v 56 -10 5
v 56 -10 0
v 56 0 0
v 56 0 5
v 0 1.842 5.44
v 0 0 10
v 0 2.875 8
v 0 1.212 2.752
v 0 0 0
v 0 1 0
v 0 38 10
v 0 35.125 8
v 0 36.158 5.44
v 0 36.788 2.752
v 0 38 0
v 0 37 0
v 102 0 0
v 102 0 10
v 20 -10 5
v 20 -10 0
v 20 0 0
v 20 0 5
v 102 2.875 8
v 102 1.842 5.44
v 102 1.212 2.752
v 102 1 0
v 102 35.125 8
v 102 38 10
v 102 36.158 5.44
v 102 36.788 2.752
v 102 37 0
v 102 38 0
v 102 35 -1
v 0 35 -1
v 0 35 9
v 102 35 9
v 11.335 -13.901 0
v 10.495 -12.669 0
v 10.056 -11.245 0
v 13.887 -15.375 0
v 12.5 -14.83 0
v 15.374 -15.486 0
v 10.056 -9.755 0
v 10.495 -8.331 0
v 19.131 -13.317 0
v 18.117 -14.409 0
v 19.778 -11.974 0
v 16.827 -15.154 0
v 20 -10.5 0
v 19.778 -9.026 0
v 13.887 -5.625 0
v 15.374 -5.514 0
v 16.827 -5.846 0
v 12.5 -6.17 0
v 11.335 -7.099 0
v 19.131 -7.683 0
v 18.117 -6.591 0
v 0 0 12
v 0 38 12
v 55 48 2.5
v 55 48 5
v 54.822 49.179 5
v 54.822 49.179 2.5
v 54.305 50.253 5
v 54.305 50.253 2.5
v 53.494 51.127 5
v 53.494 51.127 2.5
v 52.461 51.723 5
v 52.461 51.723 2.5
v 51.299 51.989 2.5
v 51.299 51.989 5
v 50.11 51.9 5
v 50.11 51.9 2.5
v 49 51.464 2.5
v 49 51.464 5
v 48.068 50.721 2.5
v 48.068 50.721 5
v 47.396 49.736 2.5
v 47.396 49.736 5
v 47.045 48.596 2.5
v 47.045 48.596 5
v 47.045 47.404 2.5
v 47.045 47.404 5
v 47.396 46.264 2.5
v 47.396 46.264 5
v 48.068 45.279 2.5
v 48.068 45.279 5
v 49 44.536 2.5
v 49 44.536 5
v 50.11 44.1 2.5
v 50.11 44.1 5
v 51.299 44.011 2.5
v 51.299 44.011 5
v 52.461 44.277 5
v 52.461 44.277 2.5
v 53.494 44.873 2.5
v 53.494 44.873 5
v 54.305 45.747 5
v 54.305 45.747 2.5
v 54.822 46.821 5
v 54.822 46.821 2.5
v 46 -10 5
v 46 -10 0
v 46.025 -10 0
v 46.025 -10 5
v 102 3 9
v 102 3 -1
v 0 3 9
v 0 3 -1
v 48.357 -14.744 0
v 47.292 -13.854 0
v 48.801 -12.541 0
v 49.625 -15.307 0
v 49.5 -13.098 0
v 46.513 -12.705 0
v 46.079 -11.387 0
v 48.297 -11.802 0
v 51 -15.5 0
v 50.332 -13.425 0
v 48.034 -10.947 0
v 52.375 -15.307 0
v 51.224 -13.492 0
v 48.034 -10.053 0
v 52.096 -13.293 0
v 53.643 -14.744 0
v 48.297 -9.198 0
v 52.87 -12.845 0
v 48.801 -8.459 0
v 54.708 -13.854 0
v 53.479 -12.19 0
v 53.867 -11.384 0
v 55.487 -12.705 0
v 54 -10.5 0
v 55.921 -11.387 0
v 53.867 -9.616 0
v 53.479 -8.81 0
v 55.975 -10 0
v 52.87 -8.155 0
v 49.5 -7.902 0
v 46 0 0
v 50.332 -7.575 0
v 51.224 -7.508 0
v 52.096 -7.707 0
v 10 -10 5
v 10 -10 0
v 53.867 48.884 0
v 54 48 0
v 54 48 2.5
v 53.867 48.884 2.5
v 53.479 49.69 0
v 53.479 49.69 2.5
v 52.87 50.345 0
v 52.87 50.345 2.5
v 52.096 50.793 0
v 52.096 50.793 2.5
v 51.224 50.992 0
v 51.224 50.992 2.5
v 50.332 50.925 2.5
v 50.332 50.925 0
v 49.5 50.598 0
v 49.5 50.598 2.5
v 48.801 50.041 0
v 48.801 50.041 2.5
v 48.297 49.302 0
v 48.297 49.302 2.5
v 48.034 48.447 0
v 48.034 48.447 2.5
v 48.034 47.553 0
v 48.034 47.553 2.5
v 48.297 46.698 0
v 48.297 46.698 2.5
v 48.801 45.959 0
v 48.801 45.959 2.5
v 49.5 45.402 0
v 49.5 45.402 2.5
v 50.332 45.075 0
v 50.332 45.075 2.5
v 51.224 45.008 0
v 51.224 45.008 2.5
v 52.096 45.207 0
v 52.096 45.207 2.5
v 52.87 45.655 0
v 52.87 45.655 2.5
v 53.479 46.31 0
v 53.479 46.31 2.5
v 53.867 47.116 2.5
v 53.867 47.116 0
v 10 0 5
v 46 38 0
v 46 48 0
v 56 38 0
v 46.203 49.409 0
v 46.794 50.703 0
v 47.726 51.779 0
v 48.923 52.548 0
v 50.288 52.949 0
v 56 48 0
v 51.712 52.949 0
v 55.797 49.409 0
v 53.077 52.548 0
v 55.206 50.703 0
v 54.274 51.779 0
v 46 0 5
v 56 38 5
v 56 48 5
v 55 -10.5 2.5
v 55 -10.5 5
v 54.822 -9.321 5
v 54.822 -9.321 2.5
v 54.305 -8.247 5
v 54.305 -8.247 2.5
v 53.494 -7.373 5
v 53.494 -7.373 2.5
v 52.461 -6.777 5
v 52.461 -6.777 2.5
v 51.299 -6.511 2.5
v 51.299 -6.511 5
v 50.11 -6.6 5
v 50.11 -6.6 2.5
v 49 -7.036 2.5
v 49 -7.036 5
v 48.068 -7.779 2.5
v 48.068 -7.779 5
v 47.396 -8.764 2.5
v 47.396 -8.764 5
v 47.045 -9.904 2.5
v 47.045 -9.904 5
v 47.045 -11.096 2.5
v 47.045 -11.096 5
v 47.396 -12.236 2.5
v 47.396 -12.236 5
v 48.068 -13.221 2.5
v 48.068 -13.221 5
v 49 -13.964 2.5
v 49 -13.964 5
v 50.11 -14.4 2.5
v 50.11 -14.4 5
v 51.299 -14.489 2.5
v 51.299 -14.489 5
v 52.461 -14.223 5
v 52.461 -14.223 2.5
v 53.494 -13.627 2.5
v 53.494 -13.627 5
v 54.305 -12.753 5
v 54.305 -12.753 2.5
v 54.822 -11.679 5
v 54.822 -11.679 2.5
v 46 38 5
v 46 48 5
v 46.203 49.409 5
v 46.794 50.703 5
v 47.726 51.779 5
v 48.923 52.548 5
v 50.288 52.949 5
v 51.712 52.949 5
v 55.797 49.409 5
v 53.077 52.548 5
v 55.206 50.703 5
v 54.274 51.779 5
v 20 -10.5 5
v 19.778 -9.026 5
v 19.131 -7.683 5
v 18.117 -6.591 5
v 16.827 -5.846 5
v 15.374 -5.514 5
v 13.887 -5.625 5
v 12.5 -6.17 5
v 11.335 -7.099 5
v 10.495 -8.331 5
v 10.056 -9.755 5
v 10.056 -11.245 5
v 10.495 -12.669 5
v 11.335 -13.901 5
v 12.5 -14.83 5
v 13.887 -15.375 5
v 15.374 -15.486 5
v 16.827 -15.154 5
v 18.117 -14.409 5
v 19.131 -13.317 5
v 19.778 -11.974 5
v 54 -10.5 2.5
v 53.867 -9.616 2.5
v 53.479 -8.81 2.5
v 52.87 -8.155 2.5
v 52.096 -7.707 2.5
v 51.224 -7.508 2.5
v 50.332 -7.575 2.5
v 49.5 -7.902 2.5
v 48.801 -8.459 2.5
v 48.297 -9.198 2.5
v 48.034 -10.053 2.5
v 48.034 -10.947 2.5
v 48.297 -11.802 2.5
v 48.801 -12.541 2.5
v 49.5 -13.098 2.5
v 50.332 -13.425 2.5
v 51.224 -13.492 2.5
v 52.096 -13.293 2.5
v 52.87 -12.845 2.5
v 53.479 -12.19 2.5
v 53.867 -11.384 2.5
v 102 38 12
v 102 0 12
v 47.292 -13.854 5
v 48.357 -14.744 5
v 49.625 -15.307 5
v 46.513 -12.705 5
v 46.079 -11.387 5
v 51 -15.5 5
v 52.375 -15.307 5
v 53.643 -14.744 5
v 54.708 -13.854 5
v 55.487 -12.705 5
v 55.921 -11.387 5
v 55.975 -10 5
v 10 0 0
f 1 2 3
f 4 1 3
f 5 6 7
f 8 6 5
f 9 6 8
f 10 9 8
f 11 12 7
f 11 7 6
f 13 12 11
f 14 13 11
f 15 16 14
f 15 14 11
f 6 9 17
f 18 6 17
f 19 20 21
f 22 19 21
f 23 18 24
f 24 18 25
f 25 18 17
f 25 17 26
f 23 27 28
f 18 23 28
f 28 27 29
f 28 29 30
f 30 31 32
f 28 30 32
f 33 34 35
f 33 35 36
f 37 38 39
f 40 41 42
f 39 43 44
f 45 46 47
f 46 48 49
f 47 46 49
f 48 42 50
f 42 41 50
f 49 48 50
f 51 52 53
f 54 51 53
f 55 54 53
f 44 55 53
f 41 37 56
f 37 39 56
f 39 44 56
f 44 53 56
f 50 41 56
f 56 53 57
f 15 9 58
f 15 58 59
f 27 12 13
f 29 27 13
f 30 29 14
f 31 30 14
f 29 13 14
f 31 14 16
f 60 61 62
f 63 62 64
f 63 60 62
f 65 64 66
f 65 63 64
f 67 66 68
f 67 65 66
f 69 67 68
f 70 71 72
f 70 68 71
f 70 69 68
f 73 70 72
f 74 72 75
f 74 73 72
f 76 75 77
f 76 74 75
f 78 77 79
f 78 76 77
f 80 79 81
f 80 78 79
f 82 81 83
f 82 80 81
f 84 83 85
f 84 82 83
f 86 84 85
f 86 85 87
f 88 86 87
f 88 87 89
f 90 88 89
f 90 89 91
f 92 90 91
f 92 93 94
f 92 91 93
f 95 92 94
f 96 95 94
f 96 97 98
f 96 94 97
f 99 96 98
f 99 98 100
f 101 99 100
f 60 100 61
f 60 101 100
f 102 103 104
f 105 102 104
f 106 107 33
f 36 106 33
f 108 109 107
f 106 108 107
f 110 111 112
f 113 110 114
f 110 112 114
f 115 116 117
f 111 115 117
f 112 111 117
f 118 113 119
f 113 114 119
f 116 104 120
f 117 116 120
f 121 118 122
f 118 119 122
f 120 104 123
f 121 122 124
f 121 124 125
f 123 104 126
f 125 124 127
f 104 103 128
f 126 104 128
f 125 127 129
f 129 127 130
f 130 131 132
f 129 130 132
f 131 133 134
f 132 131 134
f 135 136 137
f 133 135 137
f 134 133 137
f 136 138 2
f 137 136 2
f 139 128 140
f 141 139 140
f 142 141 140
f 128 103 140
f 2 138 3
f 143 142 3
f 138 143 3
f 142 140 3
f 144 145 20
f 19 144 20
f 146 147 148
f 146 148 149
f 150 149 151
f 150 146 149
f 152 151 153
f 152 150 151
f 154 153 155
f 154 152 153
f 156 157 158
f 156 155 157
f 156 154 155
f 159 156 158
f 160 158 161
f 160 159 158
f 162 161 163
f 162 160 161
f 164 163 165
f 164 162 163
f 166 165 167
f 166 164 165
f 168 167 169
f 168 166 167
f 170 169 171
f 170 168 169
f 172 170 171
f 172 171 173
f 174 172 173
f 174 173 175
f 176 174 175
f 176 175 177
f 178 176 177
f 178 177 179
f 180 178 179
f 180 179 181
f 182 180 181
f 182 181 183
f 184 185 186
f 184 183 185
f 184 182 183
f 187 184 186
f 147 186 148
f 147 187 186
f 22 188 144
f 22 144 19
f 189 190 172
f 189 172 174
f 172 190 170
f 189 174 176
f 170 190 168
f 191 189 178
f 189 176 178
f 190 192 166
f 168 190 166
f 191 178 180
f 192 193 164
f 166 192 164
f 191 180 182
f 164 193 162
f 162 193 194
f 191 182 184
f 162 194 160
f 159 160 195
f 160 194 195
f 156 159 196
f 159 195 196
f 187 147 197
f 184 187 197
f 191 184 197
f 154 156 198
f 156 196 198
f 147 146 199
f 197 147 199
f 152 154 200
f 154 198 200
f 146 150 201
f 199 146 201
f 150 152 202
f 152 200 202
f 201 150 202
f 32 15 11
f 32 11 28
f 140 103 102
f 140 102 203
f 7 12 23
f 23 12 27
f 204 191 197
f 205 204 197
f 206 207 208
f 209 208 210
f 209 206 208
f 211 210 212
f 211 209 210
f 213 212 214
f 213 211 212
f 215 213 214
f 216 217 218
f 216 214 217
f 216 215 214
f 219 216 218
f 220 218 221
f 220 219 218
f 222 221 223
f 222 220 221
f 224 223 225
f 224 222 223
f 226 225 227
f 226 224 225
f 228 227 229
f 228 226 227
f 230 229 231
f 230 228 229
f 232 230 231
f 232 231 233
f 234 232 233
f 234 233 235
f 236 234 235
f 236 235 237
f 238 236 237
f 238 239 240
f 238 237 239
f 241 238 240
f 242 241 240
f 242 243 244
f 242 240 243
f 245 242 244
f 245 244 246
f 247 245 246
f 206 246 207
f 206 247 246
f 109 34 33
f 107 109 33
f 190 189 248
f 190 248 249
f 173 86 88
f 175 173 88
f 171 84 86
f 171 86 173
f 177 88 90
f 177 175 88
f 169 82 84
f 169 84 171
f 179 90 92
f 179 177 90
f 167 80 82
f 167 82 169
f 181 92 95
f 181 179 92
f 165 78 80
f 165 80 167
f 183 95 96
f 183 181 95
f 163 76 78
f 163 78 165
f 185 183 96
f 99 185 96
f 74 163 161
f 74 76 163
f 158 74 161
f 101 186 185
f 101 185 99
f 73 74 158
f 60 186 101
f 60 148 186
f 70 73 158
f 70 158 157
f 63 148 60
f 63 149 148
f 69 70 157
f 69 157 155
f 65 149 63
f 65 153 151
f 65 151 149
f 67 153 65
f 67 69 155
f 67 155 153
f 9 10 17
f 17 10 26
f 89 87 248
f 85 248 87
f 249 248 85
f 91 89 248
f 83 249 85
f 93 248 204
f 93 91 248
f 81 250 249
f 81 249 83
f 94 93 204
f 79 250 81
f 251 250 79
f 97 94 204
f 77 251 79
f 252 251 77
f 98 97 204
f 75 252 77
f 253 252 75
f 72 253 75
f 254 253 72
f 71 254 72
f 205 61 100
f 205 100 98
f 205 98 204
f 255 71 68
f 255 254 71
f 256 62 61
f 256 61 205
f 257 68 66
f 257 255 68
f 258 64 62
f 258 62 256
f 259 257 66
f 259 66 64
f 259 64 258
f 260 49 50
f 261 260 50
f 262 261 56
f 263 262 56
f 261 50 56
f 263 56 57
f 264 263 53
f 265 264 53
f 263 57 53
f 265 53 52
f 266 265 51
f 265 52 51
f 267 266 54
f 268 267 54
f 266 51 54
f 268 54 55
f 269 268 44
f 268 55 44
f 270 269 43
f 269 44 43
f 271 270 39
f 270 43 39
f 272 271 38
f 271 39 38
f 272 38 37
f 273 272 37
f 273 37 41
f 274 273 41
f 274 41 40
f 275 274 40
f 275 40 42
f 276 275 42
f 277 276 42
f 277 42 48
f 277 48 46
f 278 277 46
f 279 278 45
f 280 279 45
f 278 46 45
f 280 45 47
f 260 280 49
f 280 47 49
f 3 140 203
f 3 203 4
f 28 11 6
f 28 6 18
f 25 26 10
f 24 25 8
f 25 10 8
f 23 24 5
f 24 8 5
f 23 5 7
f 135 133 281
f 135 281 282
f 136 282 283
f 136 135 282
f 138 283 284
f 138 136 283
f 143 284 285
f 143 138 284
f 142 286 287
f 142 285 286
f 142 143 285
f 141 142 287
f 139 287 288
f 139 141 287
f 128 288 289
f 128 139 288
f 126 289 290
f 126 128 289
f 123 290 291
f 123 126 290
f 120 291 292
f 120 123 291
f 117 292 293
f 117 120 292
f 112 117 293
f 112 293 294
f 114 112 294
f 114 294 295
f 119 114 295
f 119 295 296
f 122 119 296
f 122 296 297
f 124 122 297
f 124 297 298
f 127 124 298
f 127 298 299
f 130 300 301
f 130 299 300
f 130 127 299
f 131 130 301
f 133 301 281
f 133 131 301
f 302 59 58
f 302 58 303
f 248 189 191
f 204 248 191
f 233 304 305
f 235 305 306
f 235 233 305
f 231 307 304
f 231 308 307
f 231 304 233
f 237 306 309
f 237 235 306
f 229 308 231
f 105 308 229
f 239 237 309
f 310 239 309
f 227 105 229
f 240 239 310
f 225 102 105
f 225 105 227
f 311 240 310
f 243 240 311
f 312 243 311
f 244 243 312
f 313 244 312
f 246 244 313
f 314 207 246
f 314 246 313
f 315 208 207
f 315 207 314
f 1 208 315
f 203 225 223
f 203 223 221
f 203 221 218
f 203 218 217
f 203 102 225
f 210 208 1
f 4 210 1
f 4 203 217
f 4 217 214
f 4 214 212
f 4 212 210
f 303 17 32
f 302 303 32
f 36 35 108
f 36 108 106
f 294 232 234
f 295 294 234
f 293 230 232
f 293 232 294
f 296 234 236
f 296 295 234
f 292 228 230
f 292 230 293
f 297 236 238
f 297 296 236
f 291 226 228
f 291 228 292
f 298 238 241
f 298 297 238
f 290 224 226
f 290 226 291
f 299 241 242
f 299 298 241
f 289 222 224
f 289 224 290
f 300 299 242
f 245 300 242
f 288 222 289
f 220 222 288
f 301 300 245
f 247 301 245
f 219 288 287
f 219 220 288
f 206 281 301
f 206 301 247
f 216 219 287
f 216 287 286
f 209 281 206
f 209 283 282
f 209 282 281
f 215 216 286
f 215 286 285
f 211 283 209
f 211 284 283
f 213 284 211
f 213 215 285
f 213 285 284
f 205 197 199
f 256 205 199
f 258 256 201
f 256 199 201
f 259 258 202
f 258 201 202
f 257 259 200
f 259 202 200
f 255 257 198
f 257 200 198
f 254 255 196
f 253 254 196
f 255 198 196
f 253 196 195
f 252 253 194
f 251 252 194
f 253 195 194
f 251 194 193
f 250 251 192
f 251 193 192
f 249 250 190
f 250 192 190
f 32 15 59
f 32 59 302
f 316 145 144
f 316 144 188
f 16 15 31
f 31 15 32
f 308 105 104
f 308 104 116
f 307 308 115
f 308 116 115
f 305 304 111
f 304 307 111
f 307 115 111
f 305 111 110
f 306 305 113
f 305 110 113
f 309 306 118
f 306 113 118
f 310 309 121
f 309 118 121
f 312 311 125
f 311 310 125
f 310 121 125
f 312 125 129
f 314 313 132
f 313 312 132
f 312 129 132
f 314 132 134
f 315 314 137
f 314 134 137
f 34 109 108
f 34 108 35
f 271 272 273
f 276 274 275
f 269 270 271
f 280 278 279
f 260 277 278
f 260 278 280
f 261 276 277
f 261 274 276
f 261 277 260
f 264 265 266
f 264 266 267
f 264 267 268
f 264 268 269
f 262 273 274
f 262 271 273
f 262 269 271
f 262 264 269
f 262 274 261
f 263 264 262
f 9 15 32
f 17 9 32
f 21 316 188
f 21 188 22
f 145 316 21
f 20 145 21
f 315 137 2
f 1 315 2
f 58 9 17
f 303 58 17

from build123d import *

# Parameters (mm, degrees)
BOX002_W          = 102
BOX002_H          = 38
BOX002_DEPTH      = 10
CYLINDER003_W     = 18
CYLINDER003_H     = 102
CYLINDER003_ANGLE = 180
BOX_W             = 102
BOX_H             = 38
BOX_DEPTH         = 10
BOX004_W          = 10
BOX004_H          = 10
BOX004_DEPTH      = 5
CYLINDER005_R     = 5
CYLINDER005_DEPTH = 5
CYLINDER008_R     = 3
CYLINDER008_DEPTH = 5
CYLINDER006_R     = 4
CYLINDER006_DEPTH = 5
CYLINDER001_R     = 5
CYLINDER001_DEPTH = 5
BOX001_W          = 10
BOX001_H          = 10
BOX001_DEPTH      = 5
CYLINDER009_R     = 3
CYLINDER009_DEPTH = 5
CYLINDER007_R     = 4
CYLINDER007_DEPTH = 5
CYLINDER004_R     = 5
CYLINDER004_DEPTH = 5
BOX003_W          = 10
BOX003_H          = 10
BOX003_DEPTH      = 5
BOX005_W          = 102
BOX005_H          = 38
BOX005_DEPTH      = 12
BOX006_W          = 102
BOX006_H          = 32
BOX006_DEPTH      = 10


with BuildPart() as cube002:
    # Box002 → Box002 (new body)
    with BuildSketch(Plane.XY.offset(8)):
        with Locations((51, 19)):
            Rectangle(BOX002_W, BOX002_H)
    extrude(amount=BOX002_DEPTH)


with BuildPart() as cut002:
    # Cylinder003 → Cylinder003 (revolve)
    with BuildSketch(Plane(origin=(102, 19, 0), x_dir=(0, -1, 0), z_dir=(0, 0, -1))):
        with Locations((9, 51)):
            Rectangle(CYLINDER003_W, CYLINDER003_H)
    revolve(axis=Axis((102, 19, 0), (-1, 0, 0)), revolution_arc=CYLINDER003_ANGLE)

    # Cut002: cut Cube002
    add(cube002.part, mode=Mode.SUBTRACT)


with BuildPart() as cut003:
    # Box → Box (new body)
    with BuildSketch(Plane.XY):
        with Locations((51, 19)):
            Rectangle(BOX_W, BOX_H)
    extrude(amount=BOX_DEPTH)

    # Cut003: cut Cut002
    add(cut002.part, mode=Mode.SUBTRACT)


with BuildPart() as cube004:
    # Box004 → Box004 (new body)
    with BuildSketch(Plane(origin=(10, -10, 0), x_dir=(1, 0, 0), z_dir=(0, 0, 1))):
        with Locations((5, 5)):
            Rectangle(BOX004_W, BOX004_H)
    extrude(amount=BOX004_DEPTH)


with BuildPart() as cylinder005:
    # Cylinder005 → Cylinder005 (new body)
    with BuildSketch(Plane(origin=(15, -10.5, 0), x_dir=(1, 0, 0), z_dir=(0, 0, 1))):
        Circle(CYLINDER005_R)
    extrude(amount=CYLINDER005_DEPTH)


with BuildPart() as cylinder008:
    # Cylinder008 → Cylinder008 (new body)
    with BuildSketch(Plane(origin=(51, -10.5, -0.5), x_dir=(1, 0, 0), z_dir=(0, 0, 1))):
        Circle(CYLINDER008_R)
    extrude(amount=CYLINDER008_DEPTH)


with BuildPart() as cylinder006:
    # Cylinder006 → Cylinder006 (new body)
    with BuildSketch(Plane(origin=(51, -10.5, 2.5), x_dir=(1, 0, 0), z_dir=(0, 0, 1))):
        Circle(CYLINDER006_R)
    extrude(amount=CYLINDER006_DEPTH)


with BuildPart() as cylinder001:
    # Cylinder001 → Cylinder001 (new body)
    with BuildSketch(Plane(origin=(51, -10.5, 0), x_dir=(1, 0, 0), z_dir=(0, 0, 1))):
        Circle(CYLINDER001_R)
    extrude(amount=CYLINDER001_DEPTH)


with BuildPart() as cut005:
    # Box001 → Box001 (new body)
    with BuildSketch(Plane(origin=(46, -10, 0), x_dir=(1, 0, 0), z_dir=(0, 0, 1))):
        with Locations((5, 5)):
            Rectangle(BOX001_W, BOX001_H)
    extrude(amount=BOX001_DEPTH)

    # Fusion: union Cylinder001
    add(cylinder001.part)

    # Cut: cut Cylinder006
    add(cylinder006.part, mode=Mode.SUBTRACT)

    # Cut005: cut Cylinder008
    add(cylinder008.part, mode=Mode.SUBTRACT)


with BuildPart() as cylinder009:
    # Cylinder009 → Cylinder009 (new body)
    with BuildSketch(Plane(origin=(51, 48, -0.5), x_dir=(1, 0, 0), z_dir=(0, 0, 1))):
        Circle(CYLINDER009_R)
    extrude(amount=CYLINDER009_DEPTH)


with BuildPart() as cylinder007:
    # Cylinder007 → Cylinder007 (new body)
    with BuildSketch(Plane(origin=(51, 48, 2.5), x_dir=(1, 0, 0), z_dir=(0, 0, 1))):
        Circle(CYLINDER007_R)
    extrude(amount=CYLINDER007_DEPTH)


with BuildPart() as cylinder004:
    # Cylinder004 → Cylinder004 (new body)
    with BuildSketch(Plane(origin=(51, 48, 0), x_dir=(1, 0, 0), z_dir=(0, 0, 1))):
        Circle(CYLINDER004_R)
    extrude(amount=CYLINDER004_DEPTH)


with BuildPart() as cut006:
    # Box003 → Box003 (new body)
    with BuildSketch(Plane(origin=(46, 38, 0), x_dir=(1, 0, 0), z_dir=(0, 0, 1))):
        with Locations((5, 5)):
            Rectangle(BOX003_W, BOX003_H)
    extrude(amount=BOX003_DEPTH)

    # Fusion001: union Cylinder004
    add(cylinder004.part)

    # Cut004: cut Cylinder007
    add(cylinder007.part, mode=Mode.SUBTRACT)

    # Cut006: cut Cylinder009
    add(cylinder009.part, mode=Mode.SUBTRACT)


with BuildPart() as cube005:
    # Box005 → Box005 (new body)
    with BuildSketch(Plane.XY):
        with Locations((51, 19)):
            Rectangle(BOX005_W, BOX005_H)
    extrude(amount=BOX005_DEPTH)


with BuildPart() as cube006:
    # Box006 → Box006 (new body)
    with BuildSketch(Plane(origin=(0, 3, -1), x_dir=(1, 0, 0), z_dir=(0, 0, 1))):
        with Locations((51, 16)):
            Rectangle(BOX006_W, BOX006_H)
    extrude(amount=BOX006_DEPTH)


solid = Compound([cut003.part, cube004.part, cylinder005.part, cut005.part, cut006.part, cube005.part, cube006.part])
